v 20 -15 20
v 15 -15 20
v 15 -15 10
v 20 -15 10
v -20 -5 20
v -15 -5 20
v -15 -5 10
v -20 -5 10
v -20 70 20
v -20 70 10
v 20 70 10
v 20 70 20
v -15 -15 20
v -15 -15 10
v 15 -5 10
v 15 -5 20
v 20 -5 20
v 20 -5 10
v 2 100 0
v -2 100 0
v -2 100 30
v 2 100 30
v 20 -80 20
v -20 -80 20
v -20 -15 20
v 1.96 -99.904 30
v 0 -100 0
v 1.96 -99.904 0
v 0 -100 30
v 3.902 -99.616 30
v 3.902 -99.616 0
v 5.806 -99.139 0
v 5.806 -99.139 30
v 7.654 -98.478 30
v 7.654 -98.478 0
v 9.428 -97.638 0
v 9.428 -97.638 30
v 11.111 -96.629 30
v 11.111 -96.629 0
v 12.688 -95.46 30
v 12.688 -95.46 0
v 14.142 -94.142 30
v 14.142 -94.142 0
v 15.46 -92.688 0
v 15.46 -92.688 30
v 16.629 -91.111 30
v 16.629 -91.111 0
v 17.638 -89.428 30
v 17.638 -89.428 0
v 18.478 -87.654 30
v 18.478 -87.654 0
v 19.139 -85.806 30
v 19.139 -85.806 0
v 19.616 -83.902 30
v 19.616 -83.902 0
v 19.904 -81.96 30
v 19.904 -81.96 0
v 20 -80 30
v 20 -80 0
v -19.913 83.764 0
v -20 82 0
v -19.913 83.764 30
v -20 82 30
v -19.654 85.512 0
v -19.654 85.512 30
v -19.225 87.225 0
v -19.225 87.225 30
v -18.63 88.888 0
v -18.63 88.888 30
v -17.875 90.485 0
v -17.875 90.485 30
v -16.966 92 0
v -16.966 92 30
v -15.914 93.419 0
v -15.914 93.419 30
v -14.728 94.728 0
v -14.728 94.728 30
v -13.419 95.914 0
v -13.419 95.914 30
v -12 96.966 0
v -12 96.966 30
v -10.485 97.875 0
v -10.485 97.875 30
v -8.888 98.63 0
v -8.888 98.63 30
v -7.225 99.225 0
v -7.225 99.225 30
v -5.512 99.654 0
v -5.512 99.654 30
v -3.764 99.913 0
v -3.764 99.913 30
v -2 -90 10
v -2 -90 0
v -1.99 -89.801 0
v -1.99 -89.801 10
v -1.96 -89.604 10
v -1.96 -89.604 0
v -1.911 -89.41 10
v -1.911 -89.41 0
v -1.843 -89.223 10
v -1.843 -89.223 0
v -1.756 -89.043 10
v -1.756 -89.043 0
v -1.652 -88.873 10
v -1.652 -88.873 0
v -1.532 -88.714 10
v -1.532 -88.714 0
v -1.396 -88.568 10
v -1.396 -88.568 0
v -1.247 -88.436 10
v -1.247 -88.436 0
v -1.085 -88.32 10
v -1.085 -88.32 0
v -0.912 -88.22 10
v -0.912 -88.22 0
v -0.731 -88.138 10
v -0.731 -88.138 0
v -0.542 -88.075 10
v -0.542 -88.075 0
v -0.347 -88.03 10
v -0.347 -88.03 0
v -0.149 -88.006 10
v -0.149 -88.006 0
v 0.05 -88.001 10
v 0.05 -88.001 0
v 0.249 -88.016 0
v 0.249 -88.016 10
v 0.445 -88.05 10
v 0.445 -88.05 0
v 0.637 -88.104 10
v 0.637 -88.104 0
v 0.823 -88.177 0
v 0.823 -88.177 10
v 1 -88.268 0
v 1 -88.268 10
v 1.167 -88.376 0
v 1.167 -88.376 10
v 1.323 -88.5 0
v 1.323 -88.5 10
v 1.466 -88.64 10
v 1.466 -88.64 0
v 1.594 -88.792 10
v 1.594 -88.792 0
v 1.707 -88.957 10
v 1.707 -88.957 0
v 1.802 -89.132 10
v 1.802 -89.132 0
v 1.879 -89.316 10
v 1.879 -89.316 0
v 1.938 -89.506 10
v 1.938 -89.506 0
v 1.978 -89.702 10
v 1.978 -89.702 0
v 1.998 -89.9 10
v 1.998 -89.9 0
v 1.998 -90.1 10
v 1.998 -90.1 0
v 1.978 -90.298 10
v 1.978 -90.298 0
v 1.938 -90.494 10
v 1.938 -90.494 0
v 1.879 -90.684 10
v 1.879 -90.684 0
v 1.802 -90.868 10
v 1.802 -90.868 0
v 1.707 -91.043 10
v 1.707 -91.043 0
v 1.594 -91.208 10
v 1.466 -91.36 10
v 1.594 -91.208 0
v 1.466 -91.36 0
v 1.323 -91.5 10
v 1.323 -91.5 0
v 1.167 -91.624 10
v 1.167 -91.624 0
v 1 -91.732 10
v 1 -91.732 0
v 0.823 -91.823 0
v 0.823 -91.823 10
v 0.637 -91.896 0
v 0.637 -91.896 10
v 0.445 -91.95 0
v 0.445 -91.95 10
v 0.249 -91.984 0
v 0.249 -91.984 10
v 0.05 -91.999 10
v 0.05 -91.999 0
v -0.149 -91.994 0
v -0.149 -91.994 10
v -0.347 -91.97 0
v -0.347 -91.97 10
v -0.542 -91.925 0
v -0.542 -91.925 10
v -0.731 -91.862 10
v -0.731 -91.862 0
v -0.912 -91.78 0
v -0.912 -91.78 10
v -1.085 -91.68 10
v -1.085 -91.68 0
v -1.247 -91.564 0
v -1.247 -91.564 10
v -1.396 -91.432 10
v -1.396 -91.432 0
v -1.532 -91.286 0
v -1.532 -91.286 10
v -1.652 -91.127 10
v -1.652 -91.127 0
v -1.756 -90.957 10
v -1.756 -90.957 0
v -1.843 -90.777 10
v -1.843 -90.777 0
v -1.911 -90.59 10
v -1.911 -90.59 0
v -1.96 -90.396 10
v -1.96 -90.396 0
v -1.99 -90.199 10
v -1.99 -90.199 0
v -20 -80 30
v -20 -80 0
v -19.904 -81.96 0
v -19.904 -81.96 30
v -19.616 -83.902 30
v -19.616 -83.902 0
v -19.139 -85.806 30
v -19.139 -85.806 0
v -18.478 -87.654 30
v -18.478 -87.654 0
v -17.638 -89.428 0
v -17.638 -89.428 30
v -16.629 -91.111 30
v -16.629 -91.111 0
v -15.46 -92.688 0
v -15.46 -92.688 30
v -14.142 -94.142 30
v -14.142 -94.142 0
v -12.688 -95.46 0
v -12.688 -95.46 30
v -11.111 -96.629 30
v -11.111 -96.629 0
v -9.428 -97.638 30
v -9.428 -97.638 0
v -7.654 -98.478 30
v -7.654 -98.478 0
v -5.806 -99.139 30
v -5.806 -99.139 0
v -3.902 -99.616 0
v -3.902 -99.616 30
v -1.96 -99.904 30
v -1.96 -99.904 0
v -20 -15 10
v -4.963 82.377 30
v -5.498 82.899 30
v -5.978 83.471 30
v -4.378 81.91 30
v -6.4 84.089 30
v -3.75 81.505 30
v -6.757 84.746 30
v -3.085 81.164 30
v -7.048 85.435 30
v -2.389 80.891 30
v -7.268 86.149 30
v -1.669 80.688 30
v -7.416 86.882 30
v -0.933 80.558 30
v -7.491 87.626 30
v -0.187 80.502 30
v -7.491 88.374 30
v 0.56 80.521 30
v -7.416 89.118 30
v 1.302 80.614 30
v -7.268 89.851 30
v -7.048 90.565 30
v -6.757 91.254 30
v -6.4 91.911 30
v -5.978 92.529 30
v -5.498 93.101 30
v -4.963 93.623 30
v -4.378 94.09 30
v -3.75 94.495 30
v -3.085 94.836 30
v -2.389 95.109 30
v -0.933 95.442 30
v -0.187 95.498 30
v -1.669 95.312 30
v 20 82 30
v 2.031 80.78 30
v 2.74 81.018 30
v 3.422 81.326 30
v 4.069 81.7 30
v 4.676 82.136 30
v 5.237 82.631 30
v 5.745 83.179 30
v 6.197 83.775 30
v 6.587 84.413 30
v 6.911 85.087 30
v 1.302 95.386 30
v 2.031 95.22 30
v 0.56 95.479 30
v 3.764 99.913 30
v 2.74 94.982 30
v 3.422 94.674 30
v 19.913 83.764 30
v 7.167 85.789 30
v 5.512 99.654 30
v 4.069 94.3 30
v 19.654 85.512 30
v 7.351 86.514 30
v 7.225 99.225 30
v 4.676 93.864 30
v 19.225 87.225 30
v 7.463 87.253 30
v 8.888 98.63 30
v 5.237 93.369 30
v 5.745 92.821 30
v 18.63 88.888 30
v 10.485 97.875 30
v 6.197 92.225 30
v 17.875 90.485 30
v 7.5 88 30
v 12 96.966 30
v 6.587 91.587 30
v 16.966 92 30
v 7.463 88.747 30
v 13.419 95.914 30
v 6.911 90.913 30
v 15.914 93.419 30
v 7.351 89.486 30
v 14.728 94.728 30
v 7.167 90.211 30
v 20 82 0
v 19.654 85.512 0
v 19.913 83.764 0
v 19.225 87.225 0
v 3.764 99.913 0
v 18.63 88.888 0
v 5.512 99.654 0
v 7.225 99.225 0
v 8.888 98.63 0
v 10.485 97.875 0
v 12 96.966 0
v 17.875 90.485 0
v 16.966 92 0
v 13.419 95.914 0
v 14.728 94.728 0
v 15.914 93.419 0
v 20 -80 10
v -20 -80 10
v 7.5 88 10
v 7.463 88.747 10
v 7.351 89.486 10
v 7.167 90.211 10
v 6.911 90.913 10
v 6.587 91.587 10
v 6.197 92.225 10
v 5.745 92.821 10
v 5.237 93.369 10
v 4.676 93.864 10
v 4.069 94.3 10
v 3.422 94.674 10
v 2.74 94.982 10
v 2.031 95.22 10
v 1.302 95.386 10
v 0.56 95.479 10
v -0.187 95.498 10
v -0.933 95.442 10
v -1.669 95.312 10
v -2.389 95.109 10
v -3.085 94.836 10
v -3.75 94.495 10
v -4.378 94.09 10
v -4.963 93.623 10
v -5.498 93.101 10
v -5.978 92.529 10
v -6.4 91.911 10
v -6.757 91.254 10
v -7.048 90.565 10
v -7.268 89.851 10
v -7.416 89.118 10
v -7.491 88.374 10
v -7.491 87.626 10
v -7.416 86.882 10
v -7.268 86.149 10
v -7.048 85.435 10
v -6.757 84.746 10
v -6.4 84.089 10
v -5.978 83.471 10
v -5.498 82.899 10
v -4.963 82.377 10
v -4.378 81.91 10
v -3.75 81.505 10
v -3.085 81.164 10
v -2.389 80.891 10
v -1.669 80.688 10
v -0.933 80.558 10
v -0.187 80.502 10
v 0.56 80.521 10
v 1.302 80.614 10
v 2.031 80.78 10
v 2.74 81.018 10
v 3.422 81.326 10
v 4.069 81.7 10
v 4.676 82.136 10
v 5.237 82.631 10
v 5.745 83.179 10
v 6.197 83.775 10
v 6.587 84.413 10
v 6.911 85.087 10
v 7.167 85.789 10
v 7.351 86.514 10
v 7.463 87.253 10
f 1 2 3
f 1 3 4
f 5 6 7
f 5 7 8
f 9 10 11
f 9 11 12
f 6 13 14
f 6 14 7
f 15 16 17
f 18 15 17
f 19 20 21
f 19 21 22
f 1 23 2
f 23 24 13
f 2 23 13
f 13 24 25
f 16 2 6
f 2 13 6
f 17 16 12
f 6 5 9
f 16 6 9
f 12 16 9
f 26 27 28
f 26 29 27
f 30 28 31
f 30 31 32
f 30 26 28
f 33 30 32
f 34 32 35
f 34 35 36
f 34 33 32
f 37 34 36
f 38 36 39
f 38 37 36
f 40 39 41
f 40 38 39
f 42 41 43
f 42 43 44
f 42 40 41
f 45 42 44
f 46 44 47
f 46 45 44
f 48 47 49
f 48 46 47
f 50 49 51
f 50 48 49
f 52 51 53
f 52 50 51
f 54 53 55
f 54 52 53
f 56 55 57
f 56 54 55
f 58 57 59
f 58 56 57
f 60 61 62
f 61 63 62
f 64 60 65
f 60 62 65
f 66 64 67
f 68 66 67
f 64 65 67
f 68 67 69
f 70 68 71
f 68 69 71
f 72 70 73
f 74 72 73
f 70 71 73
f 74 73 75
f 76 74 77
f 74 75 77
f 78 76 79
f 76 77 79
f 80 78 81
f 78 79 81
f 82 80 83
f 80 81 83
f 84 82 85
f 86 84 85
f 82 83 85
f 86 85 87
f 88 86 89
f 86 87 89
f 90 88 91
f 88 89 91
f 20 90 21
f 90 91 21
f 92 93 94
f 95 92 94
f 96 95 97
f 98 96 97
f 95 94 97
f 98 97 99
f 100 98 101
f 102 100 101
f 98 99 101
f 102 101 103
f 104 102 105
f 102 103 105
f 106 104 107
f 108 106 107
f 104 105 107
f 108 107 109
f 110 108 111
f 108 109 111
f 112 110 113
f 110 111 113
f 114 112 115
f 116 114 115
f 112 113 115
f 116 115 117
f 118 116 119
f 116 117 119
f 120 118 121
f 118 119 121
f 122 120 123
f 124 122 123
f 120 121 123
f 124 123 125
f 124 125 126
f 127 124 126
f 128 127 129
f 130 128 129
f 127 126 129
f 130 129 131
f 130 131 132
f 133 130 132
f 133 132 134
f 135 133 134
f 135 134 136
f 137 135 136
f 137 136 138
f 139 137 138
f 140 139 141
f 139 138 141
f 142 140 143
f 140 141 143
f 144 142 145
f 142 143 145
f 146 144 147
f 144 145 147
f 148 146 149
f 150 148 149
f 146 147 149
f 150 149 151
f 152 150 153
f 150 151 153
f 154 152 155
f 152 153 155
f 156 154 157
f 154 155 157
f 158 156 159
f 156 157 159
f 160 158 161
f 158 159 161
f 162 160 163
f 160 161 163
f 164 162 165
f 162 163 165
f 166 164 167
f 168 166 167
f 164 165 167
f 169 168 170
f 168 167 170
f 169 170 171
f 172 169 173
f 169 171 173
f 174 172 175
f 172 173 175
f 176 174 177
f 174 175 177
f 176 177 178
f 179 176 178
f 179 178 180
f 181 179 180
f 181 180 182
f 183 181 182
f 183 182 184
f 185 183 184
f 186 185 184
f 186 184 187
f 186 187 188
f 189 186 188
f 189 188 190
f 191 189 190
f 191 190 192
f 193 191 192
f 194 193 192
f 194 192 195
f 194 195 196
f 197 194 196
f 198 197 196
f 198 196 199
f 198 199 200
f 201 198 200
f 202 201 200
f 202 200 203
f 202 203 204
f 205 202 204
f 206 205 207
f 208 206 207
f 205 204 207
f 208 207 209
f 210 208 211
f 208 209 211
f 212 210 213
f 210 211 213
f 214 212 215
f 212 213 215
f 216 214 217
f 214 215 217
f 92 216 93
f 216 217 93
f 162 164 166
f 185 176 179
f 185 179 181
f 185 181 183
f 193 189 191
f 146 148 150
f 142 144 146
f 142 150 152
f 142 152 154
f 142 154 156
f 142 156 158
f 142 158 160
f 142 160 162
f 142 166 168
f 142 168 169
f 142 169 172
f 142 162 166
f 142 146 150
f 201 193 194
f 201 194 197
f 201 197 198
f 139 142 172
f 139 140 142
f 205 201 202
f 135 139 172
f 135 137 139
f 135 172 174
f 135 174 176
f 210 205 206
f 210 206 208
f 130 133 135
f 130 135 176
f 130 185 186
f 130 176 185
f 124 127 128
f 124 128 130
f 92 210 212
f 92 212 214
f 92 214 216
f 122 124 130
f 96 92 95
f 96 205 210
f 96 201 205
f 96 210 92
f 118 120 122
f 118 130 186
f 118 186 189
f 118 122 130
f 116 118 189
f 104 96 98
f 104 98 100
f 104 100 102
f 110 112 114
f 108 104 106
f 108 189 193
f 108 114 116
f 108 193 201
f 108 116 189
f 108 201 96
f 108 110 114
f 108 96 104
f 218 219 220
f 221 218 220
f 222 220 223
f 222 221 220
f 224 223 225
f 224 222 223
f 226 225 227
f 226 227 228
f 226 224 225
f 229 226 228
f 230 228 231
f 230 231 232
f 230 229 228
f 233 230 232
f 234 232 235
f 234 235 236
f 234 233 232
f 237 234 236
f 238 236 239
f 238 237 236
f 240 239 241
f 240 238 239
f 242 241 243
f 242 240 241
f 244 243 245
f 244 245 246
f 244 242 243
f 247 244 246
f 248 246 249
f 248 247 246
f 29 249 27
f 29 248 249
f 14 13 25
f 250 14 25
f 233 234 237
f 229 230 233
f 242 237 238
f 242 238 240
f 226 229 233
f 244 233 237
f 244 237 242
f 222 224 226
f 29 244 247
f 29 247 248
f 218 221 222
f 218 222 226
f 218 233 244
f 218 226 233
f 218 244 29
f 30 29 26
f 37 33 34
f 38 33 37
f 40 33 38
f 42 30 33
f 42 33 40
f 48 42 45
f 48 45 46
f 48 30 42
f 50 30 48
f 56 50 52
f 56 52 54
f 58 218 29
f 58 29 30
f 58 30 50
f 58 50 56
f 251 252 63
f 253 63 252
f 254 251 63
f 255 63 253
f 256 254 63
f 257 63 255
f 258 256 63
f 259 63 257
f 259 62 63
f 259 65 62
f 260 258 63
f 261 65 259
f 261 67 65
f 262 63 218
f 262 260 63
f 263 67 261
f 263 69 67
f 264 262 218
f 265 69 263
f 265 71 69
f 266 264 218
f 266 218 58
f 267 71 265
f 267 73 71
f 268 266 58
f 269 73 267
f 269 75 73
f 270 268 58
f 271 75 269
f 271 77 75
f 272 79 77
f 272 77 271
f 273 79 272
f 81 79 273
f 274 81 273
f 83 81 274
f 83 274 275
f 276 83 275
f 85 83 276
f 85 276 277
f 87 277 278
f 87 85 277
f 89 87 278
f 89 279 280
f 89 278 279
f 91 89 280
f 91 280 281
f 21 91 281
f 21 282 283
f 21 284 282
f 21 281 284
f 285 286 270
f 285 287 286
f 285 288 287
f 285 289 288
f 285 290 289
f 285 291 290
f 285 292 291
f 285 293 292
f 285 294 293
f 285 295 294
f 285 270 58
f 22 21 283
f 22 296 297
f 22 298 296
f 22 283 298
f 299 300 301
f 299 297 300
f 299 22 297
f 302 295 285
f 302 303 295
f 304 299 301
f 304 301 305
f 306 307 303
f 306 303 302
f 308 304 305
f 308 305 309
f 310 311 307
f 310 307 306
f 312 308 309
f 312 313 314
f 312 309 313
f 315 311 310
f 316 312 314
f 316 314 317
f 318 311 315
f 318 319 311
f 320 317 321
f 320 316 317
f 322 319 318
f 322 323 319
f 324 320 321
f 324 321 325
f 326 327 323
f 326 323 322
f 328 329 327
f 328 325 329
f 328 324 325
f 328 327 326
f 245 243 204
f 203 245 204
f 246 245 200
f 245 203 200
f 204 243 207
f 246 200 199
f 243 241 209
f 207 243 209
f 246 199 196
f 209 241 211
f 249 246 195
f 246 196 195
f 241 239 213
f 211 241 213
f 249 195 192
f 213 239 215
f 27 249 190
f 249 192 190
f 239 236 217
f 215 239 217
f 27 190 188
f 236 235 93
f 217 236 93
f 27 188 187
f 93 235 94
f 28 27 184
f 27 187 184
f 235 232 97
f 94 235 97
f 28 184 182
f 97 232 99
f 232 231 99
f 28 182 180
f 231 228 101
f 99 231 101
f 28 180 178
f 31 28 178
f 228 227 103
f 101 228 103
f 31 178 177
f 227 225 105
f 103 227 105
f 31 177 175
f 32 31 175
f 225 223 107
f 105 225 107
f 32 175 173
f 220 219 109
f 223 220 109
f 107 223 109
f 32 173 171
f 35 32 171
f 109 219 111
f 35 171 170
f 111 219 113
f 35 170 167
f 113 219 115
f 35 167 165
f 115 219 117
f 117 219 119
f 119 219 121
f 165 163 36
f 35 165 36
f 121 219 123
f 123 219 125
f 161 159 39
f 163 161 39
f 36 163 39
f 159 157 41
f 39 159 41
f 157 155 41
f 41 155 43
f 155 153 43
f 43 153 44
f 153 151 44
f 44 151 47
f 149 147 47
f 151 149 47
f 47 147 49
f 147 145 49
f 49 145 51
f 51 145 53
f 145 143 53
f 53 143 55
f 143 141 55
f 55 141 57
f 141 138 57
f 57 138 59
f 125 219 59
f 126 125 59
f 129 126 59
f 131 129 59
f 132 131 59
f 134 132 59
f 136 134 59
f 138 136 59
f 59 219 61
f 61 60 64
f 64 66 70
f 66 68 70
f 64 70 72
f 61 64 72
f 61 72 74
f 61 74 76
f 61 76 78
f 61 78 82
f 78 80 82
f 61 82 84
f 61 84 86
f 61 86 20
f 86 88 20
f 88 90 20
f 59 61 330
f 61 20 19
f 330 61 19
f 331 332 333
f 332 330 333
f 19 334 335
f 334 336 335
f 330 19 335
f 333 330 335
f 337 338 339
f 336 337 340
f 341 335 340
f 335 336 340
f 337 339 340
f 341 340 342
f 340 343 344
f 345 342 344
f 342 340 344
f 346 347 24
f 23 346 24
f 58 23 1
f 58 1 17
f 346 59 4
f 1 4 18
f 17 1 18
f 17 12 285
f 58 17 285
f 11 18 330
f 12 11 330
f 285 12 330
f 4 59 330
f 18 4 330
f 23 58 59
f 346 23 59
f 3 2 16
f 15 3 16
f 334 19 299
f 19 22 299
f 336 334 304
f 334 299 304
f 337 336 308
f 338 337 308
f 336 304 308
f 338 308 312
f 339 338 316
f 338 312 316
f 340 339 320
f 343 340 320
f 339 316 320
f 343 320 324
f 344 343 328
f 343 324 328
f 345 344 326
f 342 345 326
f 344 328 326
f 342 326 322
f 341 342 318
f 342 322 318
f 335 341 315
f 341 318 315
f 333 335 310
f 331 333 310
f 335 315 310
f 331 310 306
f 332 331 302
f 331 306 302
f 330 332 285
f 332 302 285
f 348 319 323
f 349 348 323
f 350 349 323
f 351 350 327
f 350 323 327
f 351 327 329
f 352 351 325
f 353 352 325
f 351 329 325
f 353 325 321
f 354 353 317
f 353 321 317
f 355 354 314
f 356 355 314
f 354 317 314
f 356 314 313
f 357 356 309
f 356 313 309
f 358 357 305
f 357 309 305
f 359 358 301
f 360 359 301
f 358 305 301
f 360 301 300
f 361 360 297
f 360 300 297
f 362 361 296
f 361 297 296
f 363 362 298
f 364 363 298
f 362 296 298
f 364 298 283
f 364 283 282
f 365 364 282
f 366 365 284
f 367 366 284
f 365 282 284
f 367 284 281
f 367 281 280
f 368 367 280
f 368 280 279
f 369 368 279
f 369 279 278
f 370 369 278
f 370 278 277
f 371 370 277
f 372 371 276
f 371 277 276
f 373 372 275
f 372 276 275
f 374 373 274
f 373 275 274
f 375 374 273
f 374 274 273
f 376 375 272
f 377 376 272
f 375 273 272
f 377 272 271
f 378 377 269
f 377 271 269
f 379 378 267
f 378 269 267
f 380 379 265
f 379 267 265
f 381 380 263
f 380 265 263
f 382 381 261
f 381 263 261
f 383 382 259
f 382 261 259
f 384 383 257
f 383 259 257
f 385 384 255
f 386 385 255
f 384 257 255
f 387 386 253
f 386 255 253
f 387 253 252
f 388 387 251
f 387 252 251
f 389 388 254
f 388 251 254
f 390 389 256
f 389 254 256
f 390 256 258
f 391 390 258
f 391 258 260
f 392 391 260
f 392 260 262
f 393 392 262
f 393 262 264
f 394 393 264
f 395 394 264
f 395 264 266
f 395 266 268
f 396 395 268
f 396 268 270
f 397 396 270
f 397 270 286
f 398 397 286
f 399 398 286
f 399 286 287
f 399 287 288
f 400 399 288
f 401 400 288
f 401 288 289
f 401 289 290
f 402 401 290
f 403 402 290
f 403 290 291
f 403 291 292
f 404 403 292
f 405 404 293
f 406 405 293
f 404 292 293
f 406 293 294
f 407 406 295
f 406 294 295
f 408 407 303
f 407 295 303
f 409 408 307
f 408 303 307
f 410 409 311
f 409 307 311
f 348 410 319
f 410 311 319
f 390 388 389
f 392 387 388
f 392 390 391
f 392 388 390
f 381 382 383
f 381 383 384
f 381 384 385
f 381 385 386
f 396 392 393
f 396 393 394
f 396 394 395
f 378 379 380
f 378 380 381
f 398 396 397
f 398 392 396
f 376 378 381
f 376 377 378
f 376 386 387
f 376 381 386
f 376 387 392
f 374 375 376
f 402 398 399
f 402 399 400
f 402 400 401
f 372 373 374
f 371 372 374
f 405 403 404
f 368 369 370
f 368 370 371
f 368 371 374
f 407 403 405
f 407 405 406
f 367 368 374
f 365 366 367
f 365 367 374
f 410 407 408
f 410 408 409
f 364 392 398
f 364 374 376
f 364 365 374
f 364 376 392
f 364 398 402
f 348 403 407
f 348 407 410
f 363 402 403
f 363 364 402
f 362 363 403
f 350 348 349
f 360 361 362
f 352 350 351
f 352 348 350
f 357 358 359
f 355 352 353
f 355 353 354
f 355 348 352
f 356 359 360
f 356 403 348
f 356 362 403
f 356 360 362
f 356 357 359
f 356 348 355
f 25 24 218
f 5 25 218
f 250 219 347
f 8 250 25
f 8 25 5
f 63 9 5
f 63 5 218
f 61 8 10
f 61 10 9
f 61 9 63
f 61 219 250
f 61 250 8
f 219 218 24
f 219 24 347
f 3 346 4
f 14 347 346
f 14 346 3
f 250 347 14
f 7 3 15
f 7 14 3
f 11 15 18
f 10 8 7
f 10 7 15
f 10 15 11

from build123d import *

# Parameters (mm, degrees)
SKETCH2_W           = 40
SKETCH2_H           = 200
BOSS_EXTRUDE1_DEPTH = 30
SKETCH3_R           = 2
CUT_EXTRUDE1_DEPTH  = 10
FILLET1_R           = 20
SKETCH5_R           = 7.5
CUT_EXTRUDE3_DEPTH  = 20
FILLET2_R           = 18
SKETCH6_W           = 10
SKETCH6_H           = 150
CUT_EXTRUDE4_DEPTH  = 112.803398875
SKETCH7_W           = 5
SKETCH7_H           = 10
BOSS_EXTRUDE2_DEPTH = 15


with BuildPart() as part:
    # Sketch2 → Boss-Extrude1 (new body)
    with BuildSketch(Plane.XY):
        Rectangle(SKETCH2_W, SKETCH2_H)
    extrude(amount=BOSS_EXTRUDE1_DEPTH)

    # Sketch3 → Cut-Extrude1 (cut)
    with BuildSketch(Plane(origin=(0, 0, 0), x_dir=(-1, 0, 0), z_dir=(0, 0, -1))):
        with Locations((0, -90)):
            Circle(SKETCH3_R)
    extrude(amount=-CUT_EXTRUDE1_DEPTH, mode=Mode.SUBTRACT)

    # Fillet1
    fillet1_edges = [part.edges().sort_by_distance(p)[0] for p in [
        (20, -100, 15),
        (-20, -100, 15),
    ]]
    fillet(fillet1_edges, radius=FILLET1_R - 0.0001)  # a hair under: the kernel refuses the full size

    # Sketch5 → Cut-Extrude3 (cut)
    with BuildSketch(Plane.XY.offset(30)):
        with Locations((0, 88)):
            Circle(SKETCH5_R)
    extrude(amount=-CUT_EXTRUDE3_DEPTH, mode=Mode.SUBTRACT)

    # Fillet2
    fillet2_edges = [part.edges().sort_by_distance(p)[0] for p in [
        (-20, 100, 15),
        (20, 100, 15),
    ]]
    fillet(fillet2_edges, radius=FILLET2_R)

    # Sketch6 → Cut-Extrude4 (cut, through all)
    with BuildSketch(Plane.ZY.offset(20)):
        with Locations((15, -5)):
            Rectangle(SKETCH6_W, SKETCH6_H)
    extrude(amount=-CUT_EXTRUDE4_DEPTH, mode=Mode.SUBTRACT)

    # Sketch7 → Boss-Extrude2 (add)
    with BuildSketch(Plane(origin=(0, 0, 20), x_dir=(-1, 0, 0), z_dir=(0, 0, -1))):
        with Locations((17.5, -10)):
            Rectangle(SKETCH7_W, SKETCH7_H)
    boss_extrude2 = extrude(amount=BOSS_EXTRUDE2_DEPTH)

    # Mirror1: Boss-Extrude2 across plane
    add(boss_extrude2.mirror(Plane(origin=(0, 0, 0), x_dir=(0, 0, 1), z_dir=(1, 0, 0))))


solid = part.part
